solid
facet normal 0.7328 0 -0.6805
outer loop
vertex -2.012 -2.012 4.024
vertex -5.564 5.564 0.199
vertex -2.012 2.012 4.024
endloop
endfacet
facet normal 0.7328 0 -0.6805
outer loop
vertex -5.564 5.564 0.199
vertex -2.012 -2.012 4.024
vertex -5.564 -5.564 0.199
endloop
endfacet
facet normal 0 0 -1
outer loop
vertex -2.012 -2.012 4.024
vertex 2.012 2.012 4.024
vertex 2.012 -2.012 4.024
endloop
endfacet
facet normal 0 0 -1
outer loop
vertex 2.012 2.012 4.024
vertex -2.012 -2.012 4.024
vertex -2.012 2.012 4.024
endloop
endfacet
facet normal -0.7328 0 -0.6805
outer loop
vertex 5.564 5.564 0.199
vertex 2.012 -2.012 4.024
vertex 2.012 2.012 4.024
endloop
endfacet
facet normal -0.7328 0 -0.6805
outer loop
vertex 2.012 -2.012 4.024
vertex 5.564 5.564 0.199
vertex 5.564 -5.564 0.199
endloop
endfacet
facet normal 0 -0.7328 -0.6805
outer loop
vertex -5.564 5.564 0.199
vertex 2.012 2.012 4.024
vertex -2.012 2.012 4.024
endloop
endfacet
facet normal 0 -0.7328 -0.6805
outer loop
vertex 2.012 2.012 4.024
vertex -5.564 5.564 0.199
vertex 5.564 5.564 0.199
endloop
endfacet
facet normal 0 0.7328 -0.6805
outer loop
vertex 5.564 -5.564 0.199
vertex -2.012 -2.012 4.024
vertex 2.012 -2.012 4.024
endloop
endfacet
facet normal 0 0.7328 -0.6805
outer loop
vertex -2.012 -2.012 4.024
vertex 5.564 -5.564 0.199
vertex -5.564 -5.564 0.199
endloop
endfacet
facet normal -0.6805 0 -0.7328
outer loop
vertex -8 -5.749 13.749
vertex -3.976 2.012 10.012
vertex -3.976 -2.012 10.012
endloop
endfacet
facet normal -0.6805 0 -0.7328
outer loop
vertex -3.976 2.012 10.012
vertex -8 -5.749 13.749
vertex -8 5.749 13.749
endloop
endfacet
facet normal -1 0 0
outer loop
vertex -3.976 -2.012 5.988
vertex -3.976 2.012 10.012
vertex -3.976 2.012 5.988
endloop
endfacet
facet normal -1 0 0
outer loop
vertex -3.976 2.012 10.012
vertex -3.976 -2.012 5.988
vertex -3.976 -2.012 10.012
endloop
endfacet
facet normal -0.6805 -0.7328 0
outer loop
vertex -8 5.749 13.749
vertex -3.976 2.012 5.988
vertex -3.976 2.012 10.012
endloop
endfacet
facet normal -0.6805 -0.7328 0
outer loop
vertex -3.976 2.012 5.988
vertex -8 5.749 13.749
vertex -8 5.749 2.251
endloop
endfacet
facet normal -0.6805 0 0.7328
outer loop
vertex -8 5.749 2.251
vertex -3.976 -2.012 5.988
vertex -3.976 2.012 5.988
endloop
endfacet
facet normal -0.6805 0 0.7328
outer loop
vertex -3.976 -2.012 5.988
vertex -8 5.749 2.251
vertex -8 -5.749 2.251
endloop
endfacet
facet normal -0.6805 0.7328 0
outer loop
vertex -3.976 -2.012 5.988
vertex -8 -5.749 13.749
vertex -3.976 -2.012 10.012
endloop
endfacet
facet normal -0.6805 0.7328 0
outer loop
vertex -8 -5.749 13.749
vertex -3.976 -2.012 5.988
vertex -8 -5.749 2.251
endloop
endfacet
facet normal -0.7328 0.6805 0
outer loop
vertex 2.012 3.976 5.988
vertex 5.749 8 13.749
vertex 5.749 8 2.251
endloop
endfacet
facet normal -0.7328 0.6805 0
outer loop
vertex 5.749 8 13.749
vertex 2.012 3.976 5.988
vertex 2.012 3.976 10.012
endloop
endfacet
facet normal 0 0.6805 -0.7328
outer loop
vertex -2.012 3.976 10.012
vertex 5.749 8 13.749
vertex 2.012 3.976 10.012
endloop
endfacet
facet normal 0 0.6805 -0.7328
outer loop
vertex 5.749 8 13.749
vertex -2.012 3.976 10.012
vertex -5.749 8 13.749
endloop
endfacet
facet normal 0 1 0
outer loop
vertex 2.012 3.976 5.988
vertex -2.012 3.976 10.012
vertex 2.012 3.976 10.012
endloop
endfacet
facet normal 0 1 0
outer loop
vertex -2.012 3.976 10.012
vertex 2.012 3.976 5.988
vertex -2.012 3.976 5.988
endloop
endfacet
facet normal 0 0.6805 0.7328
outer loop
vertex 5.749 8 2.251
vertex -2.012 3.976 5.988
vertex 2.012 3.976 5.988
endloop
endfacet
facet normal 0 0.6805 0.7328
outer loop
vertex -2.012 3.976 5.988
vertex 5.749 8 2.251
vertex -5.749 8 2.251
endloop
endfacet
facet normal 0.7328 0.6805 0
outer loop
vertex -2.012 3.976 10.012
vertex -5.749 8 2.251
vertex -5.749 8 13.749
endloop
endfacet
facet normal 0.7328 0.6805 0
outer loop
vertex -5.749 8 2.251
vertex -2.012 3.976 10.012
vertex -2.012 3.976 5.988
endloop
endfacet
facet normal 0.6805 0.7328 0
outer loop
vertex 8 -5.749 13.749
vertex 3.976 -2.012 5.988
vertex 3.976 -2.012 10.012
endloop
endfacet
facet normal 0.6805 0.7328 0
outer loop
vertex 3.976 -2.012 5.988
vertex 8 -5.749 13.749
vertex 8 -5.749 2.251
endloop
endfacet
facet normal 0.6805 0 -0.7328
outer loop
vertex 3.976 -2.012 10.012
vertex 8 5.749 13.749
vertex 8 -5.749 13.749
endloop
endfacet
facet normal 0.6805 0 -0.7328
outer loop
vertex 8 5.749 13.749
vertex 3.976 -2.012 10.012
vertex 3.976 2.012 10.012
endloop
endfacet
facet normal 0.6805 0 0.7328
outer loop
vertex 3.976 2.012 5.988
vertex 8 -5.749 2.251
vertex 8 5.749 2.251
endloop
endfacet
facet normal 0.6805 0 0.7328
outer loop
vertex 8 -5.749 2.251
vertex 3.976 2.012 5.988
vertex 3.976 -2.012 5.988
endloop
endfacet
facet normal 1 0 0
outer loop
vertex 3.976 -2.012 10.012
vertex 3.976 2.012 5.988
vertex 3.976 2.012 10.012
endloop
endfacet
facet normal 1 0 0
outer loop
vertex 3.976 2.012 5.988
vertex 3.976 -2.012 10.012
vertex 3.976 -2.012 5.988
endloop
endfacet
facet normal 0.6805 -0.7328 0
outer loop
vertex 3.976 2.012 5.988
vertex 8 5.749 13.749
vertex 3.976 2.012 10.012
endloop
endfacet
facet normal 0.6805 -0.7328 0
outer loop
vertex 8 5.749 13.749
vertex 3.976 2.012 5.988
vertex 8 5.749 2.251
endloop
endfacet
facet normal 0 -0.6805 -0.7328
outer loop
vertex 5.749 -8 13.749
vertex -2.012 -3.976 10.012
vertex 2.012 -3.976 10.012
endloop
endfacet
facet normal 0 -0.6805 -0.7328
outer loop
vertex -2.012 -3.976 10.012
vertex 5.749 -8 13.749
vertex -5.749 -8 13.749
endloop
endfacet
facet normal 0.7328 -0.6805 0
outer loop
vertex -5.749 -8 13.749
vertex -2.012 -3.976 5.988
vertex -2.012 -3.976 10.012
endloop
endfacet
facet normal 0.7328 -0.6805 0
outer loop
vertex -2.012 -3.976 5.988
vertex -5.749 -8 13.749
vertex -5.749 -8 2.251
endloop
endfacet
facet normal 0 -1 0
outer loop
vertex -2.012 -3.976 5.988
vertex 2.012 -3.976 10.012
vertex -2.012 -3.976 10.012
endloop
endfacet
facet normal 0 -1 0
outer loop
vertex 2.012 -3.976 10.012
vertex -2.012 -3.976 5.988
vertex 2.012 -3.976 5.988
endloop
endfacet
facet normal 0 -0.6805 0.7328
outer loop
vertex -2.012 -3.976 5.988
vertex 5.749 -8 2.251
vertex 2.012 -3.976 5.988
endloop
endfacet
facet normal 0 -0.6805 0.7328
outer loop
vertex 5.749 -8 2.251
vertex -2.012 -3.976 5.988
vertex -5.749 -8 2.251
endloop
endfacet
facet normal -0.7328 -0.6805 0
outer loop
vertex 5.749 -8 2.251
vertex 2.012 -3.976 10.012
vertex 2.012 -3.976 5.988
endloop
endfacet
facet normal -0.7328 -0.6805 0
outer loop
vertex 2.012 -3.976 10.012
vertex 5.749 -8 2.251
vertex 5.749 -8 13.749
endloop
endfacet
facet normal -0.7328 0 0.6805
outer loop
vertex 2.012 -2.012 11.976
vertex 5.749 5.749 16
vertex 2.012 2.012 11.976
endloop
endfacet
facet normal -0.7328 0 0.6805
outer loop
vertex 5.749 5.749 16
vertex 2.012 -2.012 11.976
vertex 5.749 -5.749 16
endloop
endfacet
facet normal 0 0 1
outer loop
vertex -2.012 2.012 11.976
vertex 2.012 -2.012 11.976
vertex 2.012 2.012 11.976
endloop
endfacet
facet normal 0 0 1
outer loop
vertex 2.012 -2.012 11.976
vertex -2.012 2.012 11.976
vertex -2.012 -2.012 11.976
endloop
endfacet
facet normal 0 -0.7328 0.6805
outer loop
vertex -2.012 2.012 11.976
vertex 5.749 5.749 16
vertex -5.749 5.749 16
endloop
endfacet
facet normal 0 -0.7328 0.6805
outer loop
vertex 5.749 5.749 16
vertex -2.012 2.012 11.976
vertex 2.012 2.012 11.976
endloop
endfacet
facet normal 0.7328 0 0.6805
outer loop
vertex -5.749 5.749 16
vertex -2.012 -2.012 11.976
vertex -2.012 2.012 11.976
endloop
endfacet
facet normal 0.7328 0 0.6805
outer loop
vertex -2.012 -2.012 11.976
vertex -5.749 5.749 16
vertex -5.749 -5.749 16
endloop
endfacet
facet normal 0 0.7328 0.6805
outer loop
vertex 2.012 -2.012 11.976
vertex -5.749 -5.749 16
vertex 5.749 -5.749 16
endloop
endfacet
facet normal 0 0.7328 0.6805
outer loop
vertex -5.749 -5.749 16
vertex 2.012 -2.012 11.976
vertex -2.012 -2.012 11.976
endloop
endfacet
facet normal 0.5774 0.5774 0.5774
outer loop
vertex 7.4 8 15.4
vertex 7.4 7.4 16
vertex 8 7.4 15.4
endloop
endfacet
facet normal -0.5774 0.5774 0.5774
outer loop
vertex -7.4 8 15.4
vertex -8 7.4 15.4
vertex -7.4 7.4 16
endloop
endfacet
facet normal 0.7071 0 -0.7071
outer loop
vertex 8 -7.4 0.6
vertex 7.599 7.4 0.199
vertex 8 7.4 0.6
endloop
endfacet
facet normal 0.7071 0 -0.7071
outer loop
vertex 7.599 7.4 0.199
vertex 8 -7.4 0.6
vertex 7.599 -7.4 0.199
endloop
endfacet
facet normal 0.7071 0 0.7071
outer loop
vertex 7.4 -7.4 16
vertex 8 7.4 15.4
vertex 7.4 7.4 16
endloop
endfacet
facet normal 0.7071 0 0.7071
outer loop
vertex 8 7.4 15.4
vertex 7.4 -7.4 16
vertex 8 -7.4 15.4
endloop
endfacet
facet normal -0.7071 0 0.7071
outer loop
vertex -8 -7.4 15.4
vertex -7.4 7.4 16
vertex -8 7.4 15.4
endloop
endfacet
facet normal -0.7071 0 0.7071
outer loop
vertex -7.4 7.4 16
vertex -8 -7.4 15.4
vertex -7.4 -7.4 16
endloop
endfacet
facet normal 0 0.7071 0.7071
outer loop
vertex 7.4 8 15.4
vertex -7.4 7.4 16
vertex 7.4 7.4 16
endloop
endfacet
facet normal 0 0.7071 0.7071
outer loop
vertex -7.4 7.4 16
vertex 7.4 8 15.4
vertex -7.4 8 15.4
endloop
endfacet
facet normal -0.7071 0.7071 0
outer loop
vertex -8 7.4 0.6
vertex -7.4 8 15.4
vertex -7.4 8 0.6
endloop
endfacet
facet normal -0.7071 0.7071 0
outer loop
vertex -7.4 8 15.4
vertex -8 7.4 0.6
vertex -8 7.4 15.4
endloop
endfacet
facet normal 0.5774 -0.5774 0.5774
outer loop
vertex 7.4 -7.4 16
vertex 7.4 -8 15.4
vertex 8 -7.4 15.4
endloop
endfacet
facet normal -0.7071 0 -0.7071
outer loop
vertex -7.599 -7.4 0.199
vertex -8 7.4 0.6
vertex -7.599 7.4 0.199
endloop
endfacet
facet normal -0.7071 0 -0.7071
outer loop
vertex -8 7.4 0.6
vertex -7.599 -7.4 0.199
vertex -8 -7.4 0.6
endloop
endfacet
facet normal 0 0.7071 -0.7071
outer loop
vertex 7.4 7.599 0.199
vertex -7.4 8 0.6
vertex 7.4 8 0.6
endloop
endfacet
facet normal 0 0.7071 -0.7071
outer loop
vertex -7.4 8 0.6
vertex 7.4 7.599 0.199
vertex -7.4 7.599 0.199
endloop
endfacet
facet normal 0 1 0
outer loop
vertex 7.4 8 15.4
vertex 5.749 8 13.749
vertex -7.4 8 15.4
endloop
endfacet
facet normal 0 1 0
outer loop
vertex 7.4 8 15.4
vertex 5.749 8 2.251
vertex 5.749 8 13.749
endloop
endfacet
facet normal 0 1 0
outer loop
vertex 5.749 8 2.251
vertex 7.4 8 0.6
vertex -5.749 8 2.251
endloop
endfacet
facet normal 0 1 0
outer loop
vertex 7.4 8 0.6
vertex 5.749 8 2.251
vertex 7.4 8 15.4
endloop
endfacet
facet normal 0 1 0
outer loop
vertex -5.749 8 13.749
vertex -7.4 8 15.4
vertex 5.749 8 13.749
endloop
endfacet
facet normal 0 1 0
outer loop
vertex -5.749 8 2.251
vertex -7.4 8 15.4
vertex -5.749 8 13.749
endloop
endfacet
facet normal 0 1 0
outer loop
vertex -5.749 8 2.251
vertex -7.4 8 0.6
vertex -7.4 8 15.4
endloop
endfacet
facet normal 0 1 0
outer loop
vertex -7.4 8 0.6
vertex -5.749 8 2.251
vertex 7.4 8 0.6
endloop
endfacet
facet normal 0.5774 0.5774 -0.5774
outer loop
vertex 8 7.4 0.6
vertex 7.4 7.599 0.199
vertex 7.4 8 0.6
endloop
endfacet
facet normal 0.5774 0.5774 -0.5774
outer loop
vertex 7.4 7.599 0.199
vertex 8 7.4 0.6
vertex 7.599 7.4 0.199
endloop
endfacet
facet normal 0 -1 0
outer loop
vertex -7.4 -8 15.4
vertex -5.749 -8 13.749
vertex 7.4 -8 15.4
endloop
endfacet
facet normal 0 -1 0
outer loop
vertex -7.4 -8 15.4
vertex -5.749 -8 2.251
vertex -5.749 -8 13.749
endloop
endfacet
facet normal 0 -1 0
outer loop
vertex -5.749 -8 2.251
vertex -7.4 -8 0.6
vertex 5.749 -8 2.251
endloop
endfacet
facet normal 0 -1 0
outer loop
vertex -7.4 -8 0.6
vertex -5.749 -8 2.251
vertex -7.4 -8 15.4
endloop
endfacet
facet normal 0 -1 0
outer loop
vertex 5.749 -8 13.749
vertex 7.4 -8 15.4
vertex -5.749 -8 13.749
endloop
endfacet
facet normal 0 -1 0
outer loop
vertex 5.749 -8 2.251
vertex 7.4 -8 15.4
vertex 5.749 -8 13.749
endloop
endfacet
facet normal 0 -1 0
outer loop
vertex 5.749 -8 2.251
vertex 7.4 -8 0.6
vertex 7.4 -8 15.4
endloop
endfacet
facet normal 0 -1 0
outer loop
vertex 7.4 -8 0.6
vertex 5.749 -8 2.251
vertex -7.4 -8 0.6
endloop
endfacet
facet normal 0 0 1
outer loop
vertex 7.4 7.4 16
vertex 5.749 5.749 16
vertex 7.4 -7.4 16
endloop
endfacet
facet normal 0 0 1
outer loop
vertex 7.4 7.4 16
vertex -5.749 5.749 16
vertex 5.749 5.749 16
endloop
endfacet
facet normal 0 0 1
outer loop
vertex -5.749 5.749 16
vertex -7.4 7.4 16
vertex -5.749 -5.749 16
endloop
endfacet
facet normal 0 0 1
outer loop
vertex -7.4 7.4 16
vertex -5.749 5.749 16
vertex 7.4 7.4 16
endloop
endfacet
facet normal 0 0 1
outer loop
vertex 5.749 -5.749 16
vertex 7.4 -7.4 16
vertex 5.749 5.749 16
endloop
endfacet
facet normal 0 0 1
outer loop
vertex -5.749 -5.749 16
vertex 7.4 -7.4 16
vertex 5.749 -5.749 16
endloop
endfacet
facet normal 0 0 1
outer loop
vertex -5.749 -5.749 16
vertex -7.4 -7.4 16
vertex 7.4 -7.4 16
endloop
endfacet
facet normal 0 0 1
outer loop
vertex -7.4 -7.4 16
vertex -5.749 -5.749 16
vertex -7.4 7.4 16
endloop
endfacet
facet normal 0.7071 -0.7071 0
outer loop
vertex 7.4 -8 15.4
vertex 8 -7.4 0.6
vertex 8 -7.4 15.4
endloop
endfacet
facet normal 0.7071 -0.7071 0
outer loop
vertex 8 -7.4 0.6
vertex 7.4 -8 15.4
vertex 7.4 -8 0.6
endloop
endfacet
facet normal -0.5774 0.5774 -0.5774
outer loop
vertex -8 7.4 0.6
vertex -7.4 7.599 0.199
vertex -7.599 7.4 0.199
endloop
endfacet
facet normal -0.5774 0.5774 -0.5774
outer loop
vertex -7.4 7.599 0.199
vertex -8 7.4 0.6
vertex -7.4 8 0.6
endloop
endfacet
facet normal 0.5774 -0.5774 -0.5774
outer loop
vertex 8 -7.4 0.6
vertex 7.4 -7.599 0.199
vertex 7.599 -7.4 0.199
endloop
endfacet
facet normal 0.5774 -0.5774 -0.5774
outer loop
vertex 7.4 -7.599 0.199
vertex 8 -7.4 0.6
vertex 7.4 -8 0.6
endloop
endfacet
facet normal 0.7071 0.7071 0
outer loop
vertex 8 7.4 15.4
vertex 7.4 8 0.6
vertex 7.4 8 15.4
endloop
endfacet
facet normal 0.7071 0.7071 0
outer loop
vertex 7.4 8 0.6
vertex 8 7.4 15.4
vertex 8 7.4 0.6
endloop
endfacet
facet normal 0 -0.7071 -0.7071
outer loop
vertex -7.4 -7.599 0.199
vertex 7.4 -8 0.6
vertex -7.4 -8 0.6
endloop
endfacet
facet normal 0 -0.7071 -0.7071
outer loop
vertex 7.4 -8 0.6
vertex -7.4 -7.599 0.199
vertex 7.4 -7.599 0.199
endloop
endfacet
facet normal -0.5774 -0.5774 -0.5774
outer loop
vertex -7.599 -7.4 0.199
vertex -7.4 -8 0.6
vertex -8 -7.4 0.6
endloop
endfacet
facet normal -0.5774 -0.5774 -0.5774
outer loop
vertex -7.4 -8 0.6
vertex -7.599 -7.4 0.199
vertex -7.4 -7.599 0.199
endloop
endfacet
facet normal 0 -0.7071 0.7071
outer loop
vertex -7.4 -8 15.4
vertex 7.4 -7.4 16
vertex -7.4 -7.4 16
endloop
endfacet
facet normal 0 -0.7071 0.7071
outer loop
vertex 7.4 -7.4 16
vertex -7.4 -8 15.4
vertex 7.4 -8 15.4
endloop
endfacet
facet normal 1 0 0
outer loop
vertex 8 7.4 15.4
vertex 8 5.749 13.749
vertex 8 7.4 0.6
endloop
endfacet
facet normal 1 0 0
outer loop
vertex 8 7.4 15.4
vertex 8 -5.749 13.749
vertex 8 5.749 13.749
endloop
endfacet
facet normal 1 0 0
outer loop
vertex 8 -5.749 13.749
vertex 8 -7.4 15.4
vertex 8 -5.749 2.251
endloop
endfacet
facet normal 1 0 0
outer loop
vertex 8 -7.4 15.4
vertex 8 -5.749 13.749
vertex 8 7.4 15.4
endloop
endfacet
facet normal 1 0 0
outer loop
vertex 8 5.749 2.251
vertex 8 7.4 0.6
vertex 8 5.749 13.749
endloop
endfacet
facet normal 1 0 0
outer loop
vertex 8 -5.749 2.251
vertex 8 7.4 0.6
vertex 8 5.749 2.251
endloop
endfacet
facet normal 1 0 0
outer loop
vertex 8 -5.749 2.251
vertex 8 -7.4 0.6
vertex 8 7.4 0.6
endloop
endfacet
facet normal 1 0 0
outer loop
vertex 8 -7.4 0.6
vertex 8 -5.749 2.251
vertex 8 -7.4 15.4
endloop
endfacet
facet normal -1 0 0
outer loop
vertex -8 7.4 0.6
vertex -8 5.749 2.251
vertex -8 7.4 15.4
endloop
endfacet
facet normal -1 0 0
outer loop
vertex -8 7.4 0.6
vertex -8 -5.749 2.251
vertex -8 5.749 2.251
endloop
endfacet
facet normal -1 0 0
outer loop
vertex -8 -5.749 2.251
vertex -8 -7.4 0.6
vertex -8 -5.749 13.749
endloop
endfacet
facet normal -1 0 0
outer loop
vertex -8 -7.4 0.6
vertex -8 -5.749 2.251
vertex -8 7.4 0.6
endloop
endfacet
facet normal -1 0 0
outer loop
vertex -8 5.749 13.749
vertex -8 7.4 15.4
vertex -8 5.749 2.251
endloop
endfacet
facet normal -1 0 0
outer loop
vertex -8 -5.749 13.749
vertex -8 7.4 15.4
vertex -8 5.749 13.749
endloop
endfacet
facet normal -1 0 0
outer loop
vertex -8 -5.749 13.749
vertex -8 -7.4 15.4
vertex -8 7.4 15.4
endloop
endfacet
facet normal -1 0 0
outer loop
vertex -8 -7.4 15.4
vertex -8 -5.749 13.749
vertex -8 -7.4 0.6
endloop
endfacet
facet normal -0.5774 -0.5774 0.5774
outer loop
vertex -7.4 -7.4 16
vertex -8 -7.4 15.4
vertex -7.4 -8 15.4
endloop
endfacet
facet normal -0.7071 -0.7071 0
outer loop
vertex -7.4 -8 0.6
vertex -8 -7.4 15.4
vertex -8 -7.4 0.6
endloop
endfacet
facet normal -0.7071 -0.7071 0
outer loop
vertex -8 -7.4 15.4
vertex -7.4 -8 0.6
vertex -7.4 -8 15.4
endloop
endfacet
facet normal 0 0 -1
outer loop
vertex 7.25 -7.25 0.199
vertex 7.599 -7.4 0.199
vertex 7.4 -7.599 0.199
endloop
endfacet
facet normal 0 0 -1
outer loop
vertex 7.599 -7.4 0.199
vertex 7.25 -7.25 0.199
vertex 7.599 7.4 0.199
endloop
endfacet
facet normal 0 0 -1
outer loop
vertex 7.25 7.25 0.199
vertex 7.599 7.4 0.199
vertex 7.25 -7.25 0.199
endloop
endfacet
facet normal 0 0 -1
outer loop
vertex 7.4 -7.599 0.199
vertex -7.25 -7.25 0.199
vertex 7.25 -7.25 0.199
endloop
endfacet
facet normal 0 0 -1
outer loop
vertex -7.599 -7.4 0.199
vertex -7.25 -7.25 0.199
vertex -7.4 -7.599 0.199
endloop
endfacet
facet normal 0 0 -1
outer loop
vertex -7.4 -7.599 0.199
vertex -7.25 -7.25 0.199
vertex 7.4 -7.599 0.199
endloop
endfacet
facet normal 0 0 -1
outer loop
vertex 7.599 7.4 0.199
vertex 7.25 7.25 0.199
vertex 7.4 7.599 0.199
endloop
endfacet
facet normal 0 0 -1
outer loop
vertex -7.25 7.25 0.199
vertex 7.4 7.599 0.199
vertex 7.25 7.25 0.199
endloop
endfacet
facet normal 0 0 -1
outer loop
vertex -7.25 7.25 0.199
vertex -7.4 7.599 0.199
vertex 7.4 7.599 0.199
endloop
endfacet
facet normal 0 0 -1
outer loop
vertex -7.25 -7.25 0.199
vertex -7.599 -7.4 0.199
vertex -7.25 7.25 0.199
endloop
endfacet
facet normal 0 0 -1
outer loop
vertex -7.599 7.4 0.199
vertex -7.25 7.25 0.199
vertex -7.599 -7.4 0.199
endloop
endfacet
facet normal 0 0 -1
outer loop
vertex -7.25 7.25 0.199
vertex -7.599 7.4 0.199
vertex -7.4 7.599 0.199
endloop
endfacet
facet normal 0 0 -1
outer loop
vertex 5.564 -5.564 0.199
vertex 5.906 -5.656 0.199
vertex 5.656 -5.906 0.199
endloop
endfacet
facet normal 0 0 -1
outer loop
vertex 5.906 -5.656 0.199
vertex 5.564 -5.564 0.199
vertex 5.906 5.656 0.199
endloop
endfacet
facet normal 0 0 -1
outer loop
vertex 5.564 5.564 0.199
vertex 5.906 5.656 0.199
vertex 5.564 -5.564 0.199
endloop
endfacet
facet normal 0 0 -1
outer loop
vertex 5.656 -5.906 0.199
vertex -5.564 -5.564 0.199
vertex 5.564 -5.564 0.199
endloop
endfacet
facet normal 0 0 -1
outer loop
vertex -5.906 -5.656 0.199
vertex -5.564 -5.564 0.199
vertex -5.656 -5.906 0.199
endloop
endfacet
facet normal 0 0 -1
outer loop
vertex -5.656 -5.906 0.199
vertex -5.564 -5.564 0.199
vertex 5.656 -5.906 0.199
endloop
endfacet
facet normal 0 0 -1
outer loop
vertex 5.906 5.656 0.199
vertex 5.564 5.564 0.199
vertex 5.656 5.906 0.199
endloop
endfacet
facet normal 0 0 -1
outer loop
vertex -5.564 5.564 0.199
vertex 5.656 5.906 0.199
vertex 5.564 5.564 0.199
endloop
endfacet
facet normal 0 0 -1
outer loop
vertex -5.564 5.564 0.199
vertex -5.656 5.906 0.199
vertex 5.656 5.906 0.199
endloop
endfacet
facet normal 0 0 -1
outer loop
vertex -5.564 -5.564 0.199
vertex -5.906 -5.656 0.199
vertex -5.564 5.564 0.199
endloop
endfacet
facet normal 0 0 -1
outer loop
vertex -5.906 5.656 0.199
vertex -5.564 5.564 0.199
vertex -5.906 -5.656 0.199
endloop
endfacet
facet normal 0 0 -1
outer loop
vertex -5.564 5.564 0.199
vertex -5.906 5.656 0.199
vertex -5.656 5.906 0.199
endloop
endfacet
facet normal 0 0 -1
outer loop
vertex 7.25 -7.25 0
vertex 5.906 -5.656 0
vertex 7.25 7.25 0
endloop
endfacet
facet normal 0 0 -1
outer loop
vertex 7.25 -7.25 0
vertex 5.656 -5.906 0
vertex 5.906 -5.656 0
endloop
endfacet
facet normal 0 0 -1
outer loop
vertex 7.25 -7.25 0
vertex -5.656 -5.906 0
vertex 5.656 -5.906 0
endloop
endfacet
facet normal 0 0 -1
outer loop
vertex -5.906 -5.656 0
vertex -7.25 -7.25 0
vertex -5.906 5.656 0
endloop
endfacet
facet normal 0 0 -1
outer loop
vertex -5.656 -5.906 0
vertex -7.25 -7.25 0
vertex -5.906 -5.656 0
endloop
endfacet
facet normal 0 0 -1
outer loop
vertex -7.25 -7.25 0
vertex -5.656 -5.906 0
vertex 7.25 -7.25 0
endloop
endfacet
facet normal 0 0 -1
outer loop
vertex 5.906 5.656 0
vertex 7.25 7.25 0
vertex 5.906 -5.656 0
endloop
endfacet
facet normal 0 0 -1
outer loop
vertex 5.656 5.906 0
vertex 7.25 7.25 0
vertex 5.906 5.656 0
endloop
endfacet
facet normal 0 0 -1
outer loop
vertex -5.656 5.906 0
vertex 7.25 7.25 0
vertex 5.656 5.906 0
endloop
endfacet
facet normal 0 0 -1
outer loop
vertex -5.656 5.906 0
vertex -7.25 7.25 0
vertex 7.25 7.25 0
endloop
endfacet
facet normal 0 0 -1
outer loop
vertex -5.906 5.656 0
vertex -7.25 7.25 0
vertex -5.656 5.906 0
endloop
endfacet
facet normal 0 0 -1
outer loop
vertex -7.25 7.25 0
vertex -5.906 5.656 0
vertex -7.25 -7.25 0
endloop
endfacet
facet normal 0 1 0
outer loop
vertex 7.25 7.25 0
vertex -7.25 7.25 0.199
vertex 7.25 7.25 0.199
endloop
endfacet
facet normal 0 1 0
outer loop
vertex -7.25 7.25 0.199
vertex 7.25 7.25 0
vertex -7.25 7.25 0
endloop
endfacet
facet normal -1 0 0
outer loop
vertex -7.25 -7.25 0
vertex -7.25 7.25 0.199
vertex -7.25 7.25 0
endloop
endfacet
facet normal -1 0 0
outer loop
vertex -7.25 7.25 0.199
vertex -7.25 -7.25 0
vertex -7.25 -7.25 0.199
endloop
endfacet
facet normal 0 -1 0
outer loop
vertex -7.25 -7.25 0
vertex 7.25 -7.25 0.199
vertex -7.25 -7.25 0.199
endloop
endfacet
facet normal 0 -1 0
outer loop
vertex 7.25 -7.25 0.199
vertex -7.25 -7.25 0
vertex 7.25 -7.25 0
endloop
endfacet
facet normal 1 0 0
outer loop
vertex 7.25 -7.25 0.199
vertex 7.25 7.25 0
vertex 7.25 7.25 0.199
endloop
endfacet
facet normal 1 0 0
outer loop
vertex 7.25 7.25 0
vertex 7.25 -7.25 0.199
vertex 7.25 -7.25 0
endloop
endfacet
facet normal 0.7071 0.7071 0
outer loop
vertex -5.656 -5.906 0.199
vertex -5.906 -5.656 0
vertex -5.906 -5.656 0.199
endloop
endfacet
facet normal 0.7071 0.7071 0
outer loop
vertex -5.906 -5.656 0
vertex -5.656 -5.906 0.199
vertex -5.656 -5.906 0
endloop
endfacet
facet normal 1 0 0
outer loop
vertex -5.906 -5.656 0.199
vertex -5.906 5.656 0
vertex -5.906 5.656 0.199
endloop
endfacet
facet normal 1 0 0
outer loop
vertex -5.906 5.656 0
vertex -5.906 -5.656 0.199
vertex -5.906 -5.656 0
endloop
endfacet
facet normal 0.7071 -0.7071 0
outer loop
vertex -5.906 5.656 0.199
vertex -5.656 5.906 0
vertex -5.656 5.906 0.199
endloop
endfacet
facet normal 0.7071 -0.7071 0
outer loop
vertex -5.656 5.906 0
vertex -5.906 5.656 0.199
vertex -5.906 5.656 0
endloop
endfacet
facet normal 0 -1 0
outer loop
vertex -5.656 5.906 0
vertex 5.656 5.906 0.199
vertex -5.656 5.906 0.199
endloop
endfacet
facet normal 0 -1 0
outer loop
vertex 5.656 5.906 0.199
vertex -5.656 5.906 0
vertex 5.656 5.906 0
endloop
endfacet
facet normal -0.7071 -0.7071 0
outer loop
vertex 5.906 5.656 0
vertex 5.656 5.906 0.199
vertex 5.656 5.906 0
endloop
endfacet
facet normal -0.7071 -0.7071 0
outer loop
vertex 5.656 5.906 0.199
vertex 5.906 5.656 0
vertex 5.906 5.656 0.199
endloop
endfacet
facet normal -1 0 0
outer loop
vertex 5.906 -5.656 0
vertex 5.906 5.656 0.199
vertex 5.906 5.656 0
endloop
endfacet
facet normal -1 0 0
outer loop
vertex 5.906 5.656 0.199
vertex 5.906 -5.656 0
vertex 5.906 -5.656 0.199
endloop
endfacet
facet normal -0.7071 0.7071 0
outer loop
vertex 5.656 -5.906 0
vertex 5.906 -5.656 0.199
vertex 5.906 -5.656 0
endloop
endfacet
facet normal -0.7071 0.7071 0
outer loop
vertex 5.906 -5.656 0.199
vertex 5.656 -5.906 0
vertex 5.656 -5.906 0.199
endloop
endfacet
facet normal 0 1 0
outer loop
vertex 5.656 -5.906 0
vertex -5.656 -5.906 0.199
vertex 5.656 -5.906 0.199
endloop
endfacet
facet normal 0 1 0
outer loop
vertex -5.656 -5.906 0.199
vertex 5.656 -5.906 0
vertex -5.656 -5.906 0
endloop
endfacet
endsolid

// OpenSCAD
module octahedron(s, flat=true) {
  translate([0, 0, flat ? s*0.4082 : 0])
    rotate([flat ? 109.47122/2 : 0, 0, 0])
      for (a = [-1, 1])
        scale([1, 1, a])
          linear_extrude(s*sqrt(2)/2, scale=0)
            square(s, center=true);
}

module small_cube() {
  cube_side = 8;
  intersection() {
    linear_extrude(cube_side)
      square(cube_side, center=true);
    translate([0, 0, cube_side/2])
      rotate([0, 0, 45])
        octahedron(cube_side*1.94, false);
  }
}

module large_cube() {
  cube_side = 16;
  chamfer = 0.6;
  
  translate([0, 0, cube_side/2]) {
    difference() {
      hull()
        for (a = [-1, 1], b = [-1, 1], c = [-1, 1])
          translate((cube_side/2 - chamfer) * [a, b, c])
            rotate([0, 0, 45])
              octahedron(chamfer*sqrt(2), flat=false);
      
      coffer = cube_side - 4.5;
      for (r = [
        [0, 0, 0],
        [0, 90, 0],
        [90, 90, 0],
        [180, 90, 0],
        [270, 90, 0],
        [0, 180, 0]
      ])
        rotate(r)
          translate([0, 0, -cube_side/2-0.001])
            linear_extrude(coffer*0.35, scale=0.35)
              square(coffer, center=true);
    }
  }
}

module print() {
  linear_extrude(0.2)
    offset(-0.25)
      projection(cut=true)
        translate([0, 0, -0.1])
          children();
  
  difference() {
    children();
    translate([0, 0, -0.001])
      linear_extrude(0.2)
        square(1000, center=true);
  }
}

print() large_cube();
